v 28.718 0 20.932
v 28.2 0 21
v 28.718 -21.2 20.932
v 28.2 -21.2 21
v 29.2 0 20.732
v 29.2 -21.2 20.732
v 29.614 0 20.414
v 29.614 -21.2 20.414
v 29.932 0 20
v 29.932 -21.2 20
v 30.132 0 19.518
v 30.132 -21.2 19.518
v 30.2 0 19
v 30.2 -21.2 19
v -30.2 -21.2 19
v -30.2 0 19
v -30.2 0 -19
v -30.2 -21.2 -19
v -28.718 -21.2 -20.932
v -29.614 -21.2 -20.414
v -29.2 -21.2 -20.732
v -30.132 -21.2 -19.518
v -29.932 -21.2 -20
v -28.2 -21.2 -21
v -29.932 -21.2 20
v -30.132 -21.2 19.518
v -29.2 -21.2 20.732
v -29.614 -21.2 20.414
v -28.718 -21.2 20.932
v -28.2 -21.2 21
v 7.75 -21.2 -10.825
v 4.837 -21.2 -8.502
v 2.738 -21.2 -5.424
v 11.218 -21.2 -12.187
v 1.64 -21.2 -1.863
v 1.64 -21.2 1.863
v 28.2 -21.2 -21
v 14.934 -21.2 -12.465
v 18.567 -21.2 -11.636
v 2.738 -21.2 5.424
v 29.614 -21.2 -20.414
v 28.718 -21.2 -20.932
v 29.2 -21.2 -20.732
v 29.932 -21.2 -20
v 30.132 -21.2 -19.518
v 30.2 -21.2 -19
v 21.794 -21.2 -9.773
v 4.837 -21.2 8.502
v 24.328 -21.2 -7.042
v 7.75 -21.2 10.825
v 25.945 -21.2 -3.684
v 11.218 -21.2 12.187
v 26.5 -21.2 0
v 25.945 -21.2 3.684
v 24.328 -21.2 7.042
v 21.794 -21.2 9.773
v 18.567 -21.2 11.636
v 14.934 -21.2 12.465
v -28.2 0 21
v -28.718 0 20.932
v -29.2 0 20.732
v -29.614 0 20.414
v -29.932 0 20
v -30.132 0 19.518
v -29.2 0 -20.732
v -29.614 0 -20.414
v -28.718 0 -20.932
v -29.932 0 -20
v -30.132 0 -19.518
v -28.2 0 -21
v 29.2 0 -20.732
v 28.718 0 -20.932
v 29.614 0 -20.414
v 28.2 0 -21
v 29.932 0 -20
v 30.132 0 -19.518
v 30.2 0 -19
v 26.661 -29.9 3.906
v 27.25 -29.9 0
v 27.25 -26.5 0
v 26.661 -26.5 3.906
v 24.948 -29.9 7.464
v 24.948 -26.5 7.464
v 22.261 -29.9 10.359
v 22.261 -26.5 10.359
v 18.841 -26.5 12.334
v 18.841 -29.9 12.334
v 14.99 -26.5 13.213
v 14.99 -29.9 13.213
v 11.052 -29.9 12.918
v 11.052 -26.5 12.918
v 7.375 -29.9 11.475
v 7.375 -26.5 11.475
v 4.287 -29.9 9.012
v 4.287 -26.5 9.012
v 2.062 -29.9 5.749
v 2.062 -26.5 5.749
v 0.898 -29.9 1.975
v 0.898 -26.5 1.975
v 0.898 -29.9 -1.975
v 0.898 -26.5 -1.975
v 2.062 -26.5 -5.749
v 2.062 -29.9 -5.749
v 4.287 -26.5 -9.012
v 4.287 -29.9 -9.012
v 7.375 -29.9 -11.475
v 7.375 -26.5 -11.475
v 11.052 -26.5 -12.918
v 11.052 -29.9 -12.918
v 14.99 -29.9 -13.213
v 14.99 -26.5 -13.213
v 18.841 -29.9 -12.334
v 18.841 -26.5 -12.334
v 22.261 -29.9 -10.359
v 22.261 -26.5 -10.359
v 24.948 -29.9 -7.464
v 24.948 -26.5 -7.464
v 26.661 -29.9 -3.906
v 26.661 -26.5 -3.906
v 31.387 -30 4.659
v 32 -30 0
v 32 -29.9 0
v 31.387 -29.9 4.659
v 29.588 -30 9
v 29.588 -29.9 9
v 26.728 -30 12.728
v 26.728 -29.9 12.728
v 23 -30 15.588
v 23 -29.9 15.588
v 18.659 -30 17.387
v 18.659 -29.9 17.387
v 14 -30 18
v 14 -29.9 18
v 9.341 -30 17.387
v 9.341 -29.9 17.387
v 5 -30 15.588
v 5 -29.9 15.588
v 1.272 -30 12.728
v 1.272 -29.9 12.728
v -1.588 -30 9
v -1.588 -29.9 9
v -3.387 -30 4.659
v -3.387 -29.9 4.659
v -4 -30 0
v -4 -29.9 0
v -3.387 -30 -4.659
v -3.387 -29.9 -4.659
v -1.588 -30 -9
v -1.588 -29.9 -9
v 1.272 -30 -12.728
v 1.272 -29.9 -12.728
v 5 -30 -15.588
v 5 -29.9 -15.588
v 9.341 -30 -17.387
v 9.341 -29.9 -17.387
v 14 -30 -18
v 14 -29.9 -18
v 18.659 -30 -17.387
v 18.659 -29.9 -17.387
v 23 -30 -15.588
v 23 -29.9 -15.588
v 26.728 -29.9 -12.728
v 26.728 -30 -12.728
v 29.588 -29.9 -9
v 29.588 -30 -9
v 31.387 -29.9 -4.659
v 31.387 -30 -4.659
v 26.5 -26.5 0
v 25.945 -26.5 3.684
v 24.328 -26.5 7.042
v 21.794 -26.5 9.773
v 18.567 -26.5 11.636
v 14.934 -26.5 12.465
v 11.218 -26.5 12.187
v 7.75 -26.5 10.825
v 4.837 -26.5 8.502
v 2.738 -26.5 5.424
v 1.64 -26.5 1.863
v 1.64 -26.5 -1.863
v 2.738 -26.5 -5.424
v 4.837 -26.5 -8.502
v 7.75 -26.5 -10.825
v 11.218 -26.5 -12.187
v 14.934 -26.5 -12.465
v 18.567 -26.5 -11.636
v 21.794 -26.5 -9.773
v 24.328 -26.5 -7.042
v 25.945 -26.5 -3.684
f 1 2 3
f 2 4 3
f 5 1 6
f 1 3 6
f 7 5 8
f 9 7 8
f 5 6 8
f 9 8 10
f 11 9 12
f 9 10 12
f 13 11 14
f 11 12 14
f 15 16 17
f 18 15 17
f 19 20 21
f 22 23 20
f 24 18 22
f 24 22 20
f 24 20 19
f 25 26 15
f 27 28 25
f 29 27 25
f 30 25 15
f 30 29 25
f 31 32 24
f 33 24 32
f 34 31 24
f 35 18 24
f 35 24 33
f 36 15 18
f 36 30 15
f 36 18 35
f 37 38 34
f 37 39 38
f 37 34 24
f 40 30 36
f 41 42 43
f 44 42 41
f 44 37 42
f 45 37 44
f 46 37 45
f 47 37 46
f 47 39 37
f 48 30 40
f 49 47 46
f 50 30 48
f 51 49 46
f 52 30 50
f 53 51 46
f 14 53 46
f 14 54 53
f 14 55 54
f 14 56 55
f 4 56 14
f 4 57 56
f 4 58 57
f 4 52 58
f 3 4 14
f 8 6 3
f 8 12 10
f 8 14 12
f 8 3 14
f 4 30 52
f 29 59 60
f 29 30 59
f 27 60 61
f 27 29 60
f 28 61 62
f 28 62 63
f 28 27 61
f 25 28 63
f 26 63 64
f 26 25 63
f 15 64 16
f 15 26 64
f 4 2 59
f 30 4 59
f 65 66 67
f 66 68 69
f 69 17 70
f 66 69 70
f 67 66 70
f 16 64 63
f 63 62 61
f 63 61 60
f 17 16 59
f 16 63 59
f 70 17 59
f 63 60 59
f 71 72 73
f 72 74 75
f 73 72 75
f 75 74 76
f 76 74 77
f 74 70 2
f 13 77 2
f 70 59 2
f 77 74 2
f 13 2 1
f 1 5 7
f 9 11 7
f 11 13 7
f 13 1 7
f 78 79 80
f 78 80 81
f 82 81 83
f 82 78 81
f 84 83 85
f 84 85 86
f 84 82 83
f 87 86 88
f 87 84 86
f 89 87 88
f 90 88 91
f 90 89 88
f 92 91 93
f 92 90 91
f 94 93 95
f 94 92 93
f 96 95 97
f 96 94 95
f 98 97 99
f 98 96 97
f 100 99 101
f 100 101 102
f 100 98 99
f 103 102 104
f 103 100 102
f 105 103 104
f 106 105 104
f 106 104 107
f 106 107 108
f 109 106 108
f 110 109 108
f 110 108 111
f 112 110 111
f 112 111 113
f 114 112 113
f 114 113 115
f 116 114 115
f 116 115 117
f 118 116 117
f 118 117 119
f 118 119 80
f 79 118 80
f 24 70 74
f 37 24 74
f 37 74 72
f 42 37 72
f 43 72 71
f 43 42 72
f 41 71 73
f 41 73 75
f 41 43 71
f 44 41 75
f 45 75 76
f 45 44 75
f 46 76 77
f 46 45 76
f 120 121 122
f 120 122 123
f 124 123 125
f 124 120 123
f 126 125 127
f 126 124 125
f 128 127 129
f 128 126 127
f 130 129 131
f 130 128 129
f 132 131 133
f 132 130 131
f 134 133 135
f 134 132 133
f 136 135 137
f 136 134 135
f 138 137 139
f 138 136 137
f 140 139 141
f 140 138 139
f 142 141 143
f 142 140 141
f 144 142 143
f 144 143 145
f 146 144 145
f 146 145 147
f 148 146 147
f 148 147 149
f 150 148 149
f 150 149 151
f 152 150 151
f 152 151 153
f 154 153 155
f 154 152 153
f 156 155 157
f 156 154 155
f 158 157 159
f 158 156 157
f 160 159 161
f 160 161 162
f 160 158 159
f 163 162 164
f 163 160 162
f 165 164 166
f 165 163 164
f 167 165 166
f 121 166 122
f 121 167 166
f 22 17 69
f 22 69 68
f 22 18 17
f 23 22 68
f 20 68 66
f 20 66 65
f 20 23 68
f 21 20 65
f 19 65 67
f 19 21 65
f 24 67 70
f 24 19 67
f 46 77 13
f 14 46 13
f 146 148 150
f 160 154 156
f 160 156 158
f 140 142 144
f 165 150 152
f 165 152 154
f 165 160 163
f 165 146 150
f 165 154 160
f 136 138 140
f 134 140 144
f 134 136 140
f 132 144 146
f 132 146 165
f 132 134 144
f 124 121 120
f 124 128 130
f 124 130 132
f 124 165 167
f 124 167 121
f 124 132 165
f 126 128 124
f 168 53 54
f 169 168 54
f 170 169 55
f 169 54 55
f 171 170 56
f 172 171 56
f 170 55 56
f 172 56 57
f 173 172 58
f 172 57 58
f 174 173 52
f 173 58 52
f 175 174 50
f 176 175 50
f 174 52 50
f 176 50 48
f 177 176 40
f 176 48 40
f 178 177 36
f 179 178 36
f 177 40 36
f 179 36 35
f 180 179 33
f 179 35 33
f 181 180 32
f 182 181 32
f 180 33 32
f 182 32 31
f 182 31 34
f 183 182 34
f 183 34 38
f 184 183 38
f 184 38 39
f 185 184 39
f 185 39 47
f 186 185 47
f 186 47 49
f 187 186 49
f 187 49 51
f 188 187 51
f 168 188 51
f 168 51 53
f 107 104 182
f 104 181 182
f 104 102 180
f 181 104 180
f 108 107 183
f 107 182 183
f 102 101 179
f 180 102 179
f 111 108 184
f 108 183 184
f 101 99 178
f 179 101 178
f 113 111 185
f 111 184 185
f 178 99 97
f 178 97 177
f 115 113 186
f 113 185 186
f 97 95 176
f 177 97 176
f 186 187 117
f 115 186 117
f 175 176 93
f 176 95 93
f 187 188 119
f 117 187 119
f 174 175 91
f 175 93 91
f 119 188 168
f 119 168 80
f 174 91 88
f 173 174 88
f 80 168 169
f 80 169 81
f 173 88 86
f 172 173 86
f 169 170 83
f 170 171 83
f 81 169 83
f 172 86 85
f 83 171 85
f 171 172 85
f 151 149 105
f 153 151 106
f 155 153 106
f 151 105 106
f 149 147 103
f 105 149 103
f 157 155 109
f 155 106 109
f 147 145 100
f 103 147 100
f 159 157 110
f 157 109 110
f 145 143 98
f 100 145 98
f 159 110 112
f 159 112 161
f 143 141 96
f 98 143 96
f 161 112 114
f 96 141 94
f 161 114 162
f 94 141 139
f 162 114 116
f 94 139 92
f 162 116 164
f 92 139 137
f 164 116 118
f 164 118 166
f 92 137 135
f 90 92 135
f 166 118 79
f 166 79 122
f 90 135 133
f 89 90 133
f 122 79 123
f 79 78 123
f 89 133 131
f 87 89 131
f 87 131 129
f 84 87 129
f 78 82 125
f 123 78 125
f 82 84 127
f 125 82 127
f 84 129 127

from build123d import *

# Parameters (mm, degrees)
F0_R      = 12.5
F1_DEPTH  = 30
F2_DEPTH  = 21.2
F3_R      = 2
F4_R      = 2
F5_R      = 2
F6_R      = 2
F7_R      = 13.25
F7_R_2    = 12.5
F8_DEPTH  = 3.5
F7_R_3    = 18
F7_R_4    = 17.5
F10_DEPTH = 0.1


# Not quite as in the source:
# - the program builds the solid bodies; features that only make, move or delete a surface that nothing else refers to are left out


with BuildPart() as f1:
    # F0 (on Front) → F1 (new body)
    with BuildSketch(Plane.XZ):
        with Locations((14, 0)):
            Circle(F0_R)
    extrude(amount=F1_DEPTH)

    # F0 (on Front) → F2 (join)
    with BuildSketch(Plane.XZ):
        Polygon((30.2, -21), (30.2, 0), (30.2, 21), (-30.2, 21), (-30.2, -21), align=None)
        with Locations((14, 0)):
            Circle(F0_R, mode=Mode.SUBTRACT)
    extrude(amount=F2_DEPTH)

    # F3
    f3_edges = [f1.edges().sort_by_distance(p)[0] for p in [
        (-30.2, -10.6, 21),
    ]]
    fillet(f3_edges, radius=F3_R)

    # F4
    f4_edges = [f1.edges().sort_by_distance(p)[0] for p in [
        (30.2, -10.6, 21),
    ]]
    fillet(f4_edges, radius=F4_R)

    # F5
    f5_edges = [f1.edges().sort_by_distance(p)[0] for p in [
        (-30.2, -10.6, -21),
    ]]
    fillet(f5_edges, radius=F5_R)

    # F6
    f6_edges = [f1.edges().sort_by_distance(p)[0] for p in [
        (30.2, -10.6, -21),
    ]]
    fillet(f6_edges, radius=F6_R)

    # F7 (on face) → F8 (join)
    with BuildSketch(Plane.XZ.offset(30)):
        with Locations((14, 0)):
            Circle(F7_R)
        with Locations((14, 0)):
            Circle(F7_R_2, mode=Mode.SUBTRACT)
    extrude(amount=-F8_DEPTH)

    # F7 (on face) → F10 (join)
    with BuildSketch(Plane.XZ.offset(30)):
        with Locations((14, 0)):
            Circle(F7_R_3)
        with Locations((14, 0)):
            Circle(F7_R_4, mode=Mode.SUBTRACT)
        with Locations((14, 0)):
            Circle(F7_R_4)
        with Locations((14, 0)):
            Circle(F7_R, mode=Mode.SUBTRACT)
    extrude(amount=-F10_DEPTH)


solid = f1.part
